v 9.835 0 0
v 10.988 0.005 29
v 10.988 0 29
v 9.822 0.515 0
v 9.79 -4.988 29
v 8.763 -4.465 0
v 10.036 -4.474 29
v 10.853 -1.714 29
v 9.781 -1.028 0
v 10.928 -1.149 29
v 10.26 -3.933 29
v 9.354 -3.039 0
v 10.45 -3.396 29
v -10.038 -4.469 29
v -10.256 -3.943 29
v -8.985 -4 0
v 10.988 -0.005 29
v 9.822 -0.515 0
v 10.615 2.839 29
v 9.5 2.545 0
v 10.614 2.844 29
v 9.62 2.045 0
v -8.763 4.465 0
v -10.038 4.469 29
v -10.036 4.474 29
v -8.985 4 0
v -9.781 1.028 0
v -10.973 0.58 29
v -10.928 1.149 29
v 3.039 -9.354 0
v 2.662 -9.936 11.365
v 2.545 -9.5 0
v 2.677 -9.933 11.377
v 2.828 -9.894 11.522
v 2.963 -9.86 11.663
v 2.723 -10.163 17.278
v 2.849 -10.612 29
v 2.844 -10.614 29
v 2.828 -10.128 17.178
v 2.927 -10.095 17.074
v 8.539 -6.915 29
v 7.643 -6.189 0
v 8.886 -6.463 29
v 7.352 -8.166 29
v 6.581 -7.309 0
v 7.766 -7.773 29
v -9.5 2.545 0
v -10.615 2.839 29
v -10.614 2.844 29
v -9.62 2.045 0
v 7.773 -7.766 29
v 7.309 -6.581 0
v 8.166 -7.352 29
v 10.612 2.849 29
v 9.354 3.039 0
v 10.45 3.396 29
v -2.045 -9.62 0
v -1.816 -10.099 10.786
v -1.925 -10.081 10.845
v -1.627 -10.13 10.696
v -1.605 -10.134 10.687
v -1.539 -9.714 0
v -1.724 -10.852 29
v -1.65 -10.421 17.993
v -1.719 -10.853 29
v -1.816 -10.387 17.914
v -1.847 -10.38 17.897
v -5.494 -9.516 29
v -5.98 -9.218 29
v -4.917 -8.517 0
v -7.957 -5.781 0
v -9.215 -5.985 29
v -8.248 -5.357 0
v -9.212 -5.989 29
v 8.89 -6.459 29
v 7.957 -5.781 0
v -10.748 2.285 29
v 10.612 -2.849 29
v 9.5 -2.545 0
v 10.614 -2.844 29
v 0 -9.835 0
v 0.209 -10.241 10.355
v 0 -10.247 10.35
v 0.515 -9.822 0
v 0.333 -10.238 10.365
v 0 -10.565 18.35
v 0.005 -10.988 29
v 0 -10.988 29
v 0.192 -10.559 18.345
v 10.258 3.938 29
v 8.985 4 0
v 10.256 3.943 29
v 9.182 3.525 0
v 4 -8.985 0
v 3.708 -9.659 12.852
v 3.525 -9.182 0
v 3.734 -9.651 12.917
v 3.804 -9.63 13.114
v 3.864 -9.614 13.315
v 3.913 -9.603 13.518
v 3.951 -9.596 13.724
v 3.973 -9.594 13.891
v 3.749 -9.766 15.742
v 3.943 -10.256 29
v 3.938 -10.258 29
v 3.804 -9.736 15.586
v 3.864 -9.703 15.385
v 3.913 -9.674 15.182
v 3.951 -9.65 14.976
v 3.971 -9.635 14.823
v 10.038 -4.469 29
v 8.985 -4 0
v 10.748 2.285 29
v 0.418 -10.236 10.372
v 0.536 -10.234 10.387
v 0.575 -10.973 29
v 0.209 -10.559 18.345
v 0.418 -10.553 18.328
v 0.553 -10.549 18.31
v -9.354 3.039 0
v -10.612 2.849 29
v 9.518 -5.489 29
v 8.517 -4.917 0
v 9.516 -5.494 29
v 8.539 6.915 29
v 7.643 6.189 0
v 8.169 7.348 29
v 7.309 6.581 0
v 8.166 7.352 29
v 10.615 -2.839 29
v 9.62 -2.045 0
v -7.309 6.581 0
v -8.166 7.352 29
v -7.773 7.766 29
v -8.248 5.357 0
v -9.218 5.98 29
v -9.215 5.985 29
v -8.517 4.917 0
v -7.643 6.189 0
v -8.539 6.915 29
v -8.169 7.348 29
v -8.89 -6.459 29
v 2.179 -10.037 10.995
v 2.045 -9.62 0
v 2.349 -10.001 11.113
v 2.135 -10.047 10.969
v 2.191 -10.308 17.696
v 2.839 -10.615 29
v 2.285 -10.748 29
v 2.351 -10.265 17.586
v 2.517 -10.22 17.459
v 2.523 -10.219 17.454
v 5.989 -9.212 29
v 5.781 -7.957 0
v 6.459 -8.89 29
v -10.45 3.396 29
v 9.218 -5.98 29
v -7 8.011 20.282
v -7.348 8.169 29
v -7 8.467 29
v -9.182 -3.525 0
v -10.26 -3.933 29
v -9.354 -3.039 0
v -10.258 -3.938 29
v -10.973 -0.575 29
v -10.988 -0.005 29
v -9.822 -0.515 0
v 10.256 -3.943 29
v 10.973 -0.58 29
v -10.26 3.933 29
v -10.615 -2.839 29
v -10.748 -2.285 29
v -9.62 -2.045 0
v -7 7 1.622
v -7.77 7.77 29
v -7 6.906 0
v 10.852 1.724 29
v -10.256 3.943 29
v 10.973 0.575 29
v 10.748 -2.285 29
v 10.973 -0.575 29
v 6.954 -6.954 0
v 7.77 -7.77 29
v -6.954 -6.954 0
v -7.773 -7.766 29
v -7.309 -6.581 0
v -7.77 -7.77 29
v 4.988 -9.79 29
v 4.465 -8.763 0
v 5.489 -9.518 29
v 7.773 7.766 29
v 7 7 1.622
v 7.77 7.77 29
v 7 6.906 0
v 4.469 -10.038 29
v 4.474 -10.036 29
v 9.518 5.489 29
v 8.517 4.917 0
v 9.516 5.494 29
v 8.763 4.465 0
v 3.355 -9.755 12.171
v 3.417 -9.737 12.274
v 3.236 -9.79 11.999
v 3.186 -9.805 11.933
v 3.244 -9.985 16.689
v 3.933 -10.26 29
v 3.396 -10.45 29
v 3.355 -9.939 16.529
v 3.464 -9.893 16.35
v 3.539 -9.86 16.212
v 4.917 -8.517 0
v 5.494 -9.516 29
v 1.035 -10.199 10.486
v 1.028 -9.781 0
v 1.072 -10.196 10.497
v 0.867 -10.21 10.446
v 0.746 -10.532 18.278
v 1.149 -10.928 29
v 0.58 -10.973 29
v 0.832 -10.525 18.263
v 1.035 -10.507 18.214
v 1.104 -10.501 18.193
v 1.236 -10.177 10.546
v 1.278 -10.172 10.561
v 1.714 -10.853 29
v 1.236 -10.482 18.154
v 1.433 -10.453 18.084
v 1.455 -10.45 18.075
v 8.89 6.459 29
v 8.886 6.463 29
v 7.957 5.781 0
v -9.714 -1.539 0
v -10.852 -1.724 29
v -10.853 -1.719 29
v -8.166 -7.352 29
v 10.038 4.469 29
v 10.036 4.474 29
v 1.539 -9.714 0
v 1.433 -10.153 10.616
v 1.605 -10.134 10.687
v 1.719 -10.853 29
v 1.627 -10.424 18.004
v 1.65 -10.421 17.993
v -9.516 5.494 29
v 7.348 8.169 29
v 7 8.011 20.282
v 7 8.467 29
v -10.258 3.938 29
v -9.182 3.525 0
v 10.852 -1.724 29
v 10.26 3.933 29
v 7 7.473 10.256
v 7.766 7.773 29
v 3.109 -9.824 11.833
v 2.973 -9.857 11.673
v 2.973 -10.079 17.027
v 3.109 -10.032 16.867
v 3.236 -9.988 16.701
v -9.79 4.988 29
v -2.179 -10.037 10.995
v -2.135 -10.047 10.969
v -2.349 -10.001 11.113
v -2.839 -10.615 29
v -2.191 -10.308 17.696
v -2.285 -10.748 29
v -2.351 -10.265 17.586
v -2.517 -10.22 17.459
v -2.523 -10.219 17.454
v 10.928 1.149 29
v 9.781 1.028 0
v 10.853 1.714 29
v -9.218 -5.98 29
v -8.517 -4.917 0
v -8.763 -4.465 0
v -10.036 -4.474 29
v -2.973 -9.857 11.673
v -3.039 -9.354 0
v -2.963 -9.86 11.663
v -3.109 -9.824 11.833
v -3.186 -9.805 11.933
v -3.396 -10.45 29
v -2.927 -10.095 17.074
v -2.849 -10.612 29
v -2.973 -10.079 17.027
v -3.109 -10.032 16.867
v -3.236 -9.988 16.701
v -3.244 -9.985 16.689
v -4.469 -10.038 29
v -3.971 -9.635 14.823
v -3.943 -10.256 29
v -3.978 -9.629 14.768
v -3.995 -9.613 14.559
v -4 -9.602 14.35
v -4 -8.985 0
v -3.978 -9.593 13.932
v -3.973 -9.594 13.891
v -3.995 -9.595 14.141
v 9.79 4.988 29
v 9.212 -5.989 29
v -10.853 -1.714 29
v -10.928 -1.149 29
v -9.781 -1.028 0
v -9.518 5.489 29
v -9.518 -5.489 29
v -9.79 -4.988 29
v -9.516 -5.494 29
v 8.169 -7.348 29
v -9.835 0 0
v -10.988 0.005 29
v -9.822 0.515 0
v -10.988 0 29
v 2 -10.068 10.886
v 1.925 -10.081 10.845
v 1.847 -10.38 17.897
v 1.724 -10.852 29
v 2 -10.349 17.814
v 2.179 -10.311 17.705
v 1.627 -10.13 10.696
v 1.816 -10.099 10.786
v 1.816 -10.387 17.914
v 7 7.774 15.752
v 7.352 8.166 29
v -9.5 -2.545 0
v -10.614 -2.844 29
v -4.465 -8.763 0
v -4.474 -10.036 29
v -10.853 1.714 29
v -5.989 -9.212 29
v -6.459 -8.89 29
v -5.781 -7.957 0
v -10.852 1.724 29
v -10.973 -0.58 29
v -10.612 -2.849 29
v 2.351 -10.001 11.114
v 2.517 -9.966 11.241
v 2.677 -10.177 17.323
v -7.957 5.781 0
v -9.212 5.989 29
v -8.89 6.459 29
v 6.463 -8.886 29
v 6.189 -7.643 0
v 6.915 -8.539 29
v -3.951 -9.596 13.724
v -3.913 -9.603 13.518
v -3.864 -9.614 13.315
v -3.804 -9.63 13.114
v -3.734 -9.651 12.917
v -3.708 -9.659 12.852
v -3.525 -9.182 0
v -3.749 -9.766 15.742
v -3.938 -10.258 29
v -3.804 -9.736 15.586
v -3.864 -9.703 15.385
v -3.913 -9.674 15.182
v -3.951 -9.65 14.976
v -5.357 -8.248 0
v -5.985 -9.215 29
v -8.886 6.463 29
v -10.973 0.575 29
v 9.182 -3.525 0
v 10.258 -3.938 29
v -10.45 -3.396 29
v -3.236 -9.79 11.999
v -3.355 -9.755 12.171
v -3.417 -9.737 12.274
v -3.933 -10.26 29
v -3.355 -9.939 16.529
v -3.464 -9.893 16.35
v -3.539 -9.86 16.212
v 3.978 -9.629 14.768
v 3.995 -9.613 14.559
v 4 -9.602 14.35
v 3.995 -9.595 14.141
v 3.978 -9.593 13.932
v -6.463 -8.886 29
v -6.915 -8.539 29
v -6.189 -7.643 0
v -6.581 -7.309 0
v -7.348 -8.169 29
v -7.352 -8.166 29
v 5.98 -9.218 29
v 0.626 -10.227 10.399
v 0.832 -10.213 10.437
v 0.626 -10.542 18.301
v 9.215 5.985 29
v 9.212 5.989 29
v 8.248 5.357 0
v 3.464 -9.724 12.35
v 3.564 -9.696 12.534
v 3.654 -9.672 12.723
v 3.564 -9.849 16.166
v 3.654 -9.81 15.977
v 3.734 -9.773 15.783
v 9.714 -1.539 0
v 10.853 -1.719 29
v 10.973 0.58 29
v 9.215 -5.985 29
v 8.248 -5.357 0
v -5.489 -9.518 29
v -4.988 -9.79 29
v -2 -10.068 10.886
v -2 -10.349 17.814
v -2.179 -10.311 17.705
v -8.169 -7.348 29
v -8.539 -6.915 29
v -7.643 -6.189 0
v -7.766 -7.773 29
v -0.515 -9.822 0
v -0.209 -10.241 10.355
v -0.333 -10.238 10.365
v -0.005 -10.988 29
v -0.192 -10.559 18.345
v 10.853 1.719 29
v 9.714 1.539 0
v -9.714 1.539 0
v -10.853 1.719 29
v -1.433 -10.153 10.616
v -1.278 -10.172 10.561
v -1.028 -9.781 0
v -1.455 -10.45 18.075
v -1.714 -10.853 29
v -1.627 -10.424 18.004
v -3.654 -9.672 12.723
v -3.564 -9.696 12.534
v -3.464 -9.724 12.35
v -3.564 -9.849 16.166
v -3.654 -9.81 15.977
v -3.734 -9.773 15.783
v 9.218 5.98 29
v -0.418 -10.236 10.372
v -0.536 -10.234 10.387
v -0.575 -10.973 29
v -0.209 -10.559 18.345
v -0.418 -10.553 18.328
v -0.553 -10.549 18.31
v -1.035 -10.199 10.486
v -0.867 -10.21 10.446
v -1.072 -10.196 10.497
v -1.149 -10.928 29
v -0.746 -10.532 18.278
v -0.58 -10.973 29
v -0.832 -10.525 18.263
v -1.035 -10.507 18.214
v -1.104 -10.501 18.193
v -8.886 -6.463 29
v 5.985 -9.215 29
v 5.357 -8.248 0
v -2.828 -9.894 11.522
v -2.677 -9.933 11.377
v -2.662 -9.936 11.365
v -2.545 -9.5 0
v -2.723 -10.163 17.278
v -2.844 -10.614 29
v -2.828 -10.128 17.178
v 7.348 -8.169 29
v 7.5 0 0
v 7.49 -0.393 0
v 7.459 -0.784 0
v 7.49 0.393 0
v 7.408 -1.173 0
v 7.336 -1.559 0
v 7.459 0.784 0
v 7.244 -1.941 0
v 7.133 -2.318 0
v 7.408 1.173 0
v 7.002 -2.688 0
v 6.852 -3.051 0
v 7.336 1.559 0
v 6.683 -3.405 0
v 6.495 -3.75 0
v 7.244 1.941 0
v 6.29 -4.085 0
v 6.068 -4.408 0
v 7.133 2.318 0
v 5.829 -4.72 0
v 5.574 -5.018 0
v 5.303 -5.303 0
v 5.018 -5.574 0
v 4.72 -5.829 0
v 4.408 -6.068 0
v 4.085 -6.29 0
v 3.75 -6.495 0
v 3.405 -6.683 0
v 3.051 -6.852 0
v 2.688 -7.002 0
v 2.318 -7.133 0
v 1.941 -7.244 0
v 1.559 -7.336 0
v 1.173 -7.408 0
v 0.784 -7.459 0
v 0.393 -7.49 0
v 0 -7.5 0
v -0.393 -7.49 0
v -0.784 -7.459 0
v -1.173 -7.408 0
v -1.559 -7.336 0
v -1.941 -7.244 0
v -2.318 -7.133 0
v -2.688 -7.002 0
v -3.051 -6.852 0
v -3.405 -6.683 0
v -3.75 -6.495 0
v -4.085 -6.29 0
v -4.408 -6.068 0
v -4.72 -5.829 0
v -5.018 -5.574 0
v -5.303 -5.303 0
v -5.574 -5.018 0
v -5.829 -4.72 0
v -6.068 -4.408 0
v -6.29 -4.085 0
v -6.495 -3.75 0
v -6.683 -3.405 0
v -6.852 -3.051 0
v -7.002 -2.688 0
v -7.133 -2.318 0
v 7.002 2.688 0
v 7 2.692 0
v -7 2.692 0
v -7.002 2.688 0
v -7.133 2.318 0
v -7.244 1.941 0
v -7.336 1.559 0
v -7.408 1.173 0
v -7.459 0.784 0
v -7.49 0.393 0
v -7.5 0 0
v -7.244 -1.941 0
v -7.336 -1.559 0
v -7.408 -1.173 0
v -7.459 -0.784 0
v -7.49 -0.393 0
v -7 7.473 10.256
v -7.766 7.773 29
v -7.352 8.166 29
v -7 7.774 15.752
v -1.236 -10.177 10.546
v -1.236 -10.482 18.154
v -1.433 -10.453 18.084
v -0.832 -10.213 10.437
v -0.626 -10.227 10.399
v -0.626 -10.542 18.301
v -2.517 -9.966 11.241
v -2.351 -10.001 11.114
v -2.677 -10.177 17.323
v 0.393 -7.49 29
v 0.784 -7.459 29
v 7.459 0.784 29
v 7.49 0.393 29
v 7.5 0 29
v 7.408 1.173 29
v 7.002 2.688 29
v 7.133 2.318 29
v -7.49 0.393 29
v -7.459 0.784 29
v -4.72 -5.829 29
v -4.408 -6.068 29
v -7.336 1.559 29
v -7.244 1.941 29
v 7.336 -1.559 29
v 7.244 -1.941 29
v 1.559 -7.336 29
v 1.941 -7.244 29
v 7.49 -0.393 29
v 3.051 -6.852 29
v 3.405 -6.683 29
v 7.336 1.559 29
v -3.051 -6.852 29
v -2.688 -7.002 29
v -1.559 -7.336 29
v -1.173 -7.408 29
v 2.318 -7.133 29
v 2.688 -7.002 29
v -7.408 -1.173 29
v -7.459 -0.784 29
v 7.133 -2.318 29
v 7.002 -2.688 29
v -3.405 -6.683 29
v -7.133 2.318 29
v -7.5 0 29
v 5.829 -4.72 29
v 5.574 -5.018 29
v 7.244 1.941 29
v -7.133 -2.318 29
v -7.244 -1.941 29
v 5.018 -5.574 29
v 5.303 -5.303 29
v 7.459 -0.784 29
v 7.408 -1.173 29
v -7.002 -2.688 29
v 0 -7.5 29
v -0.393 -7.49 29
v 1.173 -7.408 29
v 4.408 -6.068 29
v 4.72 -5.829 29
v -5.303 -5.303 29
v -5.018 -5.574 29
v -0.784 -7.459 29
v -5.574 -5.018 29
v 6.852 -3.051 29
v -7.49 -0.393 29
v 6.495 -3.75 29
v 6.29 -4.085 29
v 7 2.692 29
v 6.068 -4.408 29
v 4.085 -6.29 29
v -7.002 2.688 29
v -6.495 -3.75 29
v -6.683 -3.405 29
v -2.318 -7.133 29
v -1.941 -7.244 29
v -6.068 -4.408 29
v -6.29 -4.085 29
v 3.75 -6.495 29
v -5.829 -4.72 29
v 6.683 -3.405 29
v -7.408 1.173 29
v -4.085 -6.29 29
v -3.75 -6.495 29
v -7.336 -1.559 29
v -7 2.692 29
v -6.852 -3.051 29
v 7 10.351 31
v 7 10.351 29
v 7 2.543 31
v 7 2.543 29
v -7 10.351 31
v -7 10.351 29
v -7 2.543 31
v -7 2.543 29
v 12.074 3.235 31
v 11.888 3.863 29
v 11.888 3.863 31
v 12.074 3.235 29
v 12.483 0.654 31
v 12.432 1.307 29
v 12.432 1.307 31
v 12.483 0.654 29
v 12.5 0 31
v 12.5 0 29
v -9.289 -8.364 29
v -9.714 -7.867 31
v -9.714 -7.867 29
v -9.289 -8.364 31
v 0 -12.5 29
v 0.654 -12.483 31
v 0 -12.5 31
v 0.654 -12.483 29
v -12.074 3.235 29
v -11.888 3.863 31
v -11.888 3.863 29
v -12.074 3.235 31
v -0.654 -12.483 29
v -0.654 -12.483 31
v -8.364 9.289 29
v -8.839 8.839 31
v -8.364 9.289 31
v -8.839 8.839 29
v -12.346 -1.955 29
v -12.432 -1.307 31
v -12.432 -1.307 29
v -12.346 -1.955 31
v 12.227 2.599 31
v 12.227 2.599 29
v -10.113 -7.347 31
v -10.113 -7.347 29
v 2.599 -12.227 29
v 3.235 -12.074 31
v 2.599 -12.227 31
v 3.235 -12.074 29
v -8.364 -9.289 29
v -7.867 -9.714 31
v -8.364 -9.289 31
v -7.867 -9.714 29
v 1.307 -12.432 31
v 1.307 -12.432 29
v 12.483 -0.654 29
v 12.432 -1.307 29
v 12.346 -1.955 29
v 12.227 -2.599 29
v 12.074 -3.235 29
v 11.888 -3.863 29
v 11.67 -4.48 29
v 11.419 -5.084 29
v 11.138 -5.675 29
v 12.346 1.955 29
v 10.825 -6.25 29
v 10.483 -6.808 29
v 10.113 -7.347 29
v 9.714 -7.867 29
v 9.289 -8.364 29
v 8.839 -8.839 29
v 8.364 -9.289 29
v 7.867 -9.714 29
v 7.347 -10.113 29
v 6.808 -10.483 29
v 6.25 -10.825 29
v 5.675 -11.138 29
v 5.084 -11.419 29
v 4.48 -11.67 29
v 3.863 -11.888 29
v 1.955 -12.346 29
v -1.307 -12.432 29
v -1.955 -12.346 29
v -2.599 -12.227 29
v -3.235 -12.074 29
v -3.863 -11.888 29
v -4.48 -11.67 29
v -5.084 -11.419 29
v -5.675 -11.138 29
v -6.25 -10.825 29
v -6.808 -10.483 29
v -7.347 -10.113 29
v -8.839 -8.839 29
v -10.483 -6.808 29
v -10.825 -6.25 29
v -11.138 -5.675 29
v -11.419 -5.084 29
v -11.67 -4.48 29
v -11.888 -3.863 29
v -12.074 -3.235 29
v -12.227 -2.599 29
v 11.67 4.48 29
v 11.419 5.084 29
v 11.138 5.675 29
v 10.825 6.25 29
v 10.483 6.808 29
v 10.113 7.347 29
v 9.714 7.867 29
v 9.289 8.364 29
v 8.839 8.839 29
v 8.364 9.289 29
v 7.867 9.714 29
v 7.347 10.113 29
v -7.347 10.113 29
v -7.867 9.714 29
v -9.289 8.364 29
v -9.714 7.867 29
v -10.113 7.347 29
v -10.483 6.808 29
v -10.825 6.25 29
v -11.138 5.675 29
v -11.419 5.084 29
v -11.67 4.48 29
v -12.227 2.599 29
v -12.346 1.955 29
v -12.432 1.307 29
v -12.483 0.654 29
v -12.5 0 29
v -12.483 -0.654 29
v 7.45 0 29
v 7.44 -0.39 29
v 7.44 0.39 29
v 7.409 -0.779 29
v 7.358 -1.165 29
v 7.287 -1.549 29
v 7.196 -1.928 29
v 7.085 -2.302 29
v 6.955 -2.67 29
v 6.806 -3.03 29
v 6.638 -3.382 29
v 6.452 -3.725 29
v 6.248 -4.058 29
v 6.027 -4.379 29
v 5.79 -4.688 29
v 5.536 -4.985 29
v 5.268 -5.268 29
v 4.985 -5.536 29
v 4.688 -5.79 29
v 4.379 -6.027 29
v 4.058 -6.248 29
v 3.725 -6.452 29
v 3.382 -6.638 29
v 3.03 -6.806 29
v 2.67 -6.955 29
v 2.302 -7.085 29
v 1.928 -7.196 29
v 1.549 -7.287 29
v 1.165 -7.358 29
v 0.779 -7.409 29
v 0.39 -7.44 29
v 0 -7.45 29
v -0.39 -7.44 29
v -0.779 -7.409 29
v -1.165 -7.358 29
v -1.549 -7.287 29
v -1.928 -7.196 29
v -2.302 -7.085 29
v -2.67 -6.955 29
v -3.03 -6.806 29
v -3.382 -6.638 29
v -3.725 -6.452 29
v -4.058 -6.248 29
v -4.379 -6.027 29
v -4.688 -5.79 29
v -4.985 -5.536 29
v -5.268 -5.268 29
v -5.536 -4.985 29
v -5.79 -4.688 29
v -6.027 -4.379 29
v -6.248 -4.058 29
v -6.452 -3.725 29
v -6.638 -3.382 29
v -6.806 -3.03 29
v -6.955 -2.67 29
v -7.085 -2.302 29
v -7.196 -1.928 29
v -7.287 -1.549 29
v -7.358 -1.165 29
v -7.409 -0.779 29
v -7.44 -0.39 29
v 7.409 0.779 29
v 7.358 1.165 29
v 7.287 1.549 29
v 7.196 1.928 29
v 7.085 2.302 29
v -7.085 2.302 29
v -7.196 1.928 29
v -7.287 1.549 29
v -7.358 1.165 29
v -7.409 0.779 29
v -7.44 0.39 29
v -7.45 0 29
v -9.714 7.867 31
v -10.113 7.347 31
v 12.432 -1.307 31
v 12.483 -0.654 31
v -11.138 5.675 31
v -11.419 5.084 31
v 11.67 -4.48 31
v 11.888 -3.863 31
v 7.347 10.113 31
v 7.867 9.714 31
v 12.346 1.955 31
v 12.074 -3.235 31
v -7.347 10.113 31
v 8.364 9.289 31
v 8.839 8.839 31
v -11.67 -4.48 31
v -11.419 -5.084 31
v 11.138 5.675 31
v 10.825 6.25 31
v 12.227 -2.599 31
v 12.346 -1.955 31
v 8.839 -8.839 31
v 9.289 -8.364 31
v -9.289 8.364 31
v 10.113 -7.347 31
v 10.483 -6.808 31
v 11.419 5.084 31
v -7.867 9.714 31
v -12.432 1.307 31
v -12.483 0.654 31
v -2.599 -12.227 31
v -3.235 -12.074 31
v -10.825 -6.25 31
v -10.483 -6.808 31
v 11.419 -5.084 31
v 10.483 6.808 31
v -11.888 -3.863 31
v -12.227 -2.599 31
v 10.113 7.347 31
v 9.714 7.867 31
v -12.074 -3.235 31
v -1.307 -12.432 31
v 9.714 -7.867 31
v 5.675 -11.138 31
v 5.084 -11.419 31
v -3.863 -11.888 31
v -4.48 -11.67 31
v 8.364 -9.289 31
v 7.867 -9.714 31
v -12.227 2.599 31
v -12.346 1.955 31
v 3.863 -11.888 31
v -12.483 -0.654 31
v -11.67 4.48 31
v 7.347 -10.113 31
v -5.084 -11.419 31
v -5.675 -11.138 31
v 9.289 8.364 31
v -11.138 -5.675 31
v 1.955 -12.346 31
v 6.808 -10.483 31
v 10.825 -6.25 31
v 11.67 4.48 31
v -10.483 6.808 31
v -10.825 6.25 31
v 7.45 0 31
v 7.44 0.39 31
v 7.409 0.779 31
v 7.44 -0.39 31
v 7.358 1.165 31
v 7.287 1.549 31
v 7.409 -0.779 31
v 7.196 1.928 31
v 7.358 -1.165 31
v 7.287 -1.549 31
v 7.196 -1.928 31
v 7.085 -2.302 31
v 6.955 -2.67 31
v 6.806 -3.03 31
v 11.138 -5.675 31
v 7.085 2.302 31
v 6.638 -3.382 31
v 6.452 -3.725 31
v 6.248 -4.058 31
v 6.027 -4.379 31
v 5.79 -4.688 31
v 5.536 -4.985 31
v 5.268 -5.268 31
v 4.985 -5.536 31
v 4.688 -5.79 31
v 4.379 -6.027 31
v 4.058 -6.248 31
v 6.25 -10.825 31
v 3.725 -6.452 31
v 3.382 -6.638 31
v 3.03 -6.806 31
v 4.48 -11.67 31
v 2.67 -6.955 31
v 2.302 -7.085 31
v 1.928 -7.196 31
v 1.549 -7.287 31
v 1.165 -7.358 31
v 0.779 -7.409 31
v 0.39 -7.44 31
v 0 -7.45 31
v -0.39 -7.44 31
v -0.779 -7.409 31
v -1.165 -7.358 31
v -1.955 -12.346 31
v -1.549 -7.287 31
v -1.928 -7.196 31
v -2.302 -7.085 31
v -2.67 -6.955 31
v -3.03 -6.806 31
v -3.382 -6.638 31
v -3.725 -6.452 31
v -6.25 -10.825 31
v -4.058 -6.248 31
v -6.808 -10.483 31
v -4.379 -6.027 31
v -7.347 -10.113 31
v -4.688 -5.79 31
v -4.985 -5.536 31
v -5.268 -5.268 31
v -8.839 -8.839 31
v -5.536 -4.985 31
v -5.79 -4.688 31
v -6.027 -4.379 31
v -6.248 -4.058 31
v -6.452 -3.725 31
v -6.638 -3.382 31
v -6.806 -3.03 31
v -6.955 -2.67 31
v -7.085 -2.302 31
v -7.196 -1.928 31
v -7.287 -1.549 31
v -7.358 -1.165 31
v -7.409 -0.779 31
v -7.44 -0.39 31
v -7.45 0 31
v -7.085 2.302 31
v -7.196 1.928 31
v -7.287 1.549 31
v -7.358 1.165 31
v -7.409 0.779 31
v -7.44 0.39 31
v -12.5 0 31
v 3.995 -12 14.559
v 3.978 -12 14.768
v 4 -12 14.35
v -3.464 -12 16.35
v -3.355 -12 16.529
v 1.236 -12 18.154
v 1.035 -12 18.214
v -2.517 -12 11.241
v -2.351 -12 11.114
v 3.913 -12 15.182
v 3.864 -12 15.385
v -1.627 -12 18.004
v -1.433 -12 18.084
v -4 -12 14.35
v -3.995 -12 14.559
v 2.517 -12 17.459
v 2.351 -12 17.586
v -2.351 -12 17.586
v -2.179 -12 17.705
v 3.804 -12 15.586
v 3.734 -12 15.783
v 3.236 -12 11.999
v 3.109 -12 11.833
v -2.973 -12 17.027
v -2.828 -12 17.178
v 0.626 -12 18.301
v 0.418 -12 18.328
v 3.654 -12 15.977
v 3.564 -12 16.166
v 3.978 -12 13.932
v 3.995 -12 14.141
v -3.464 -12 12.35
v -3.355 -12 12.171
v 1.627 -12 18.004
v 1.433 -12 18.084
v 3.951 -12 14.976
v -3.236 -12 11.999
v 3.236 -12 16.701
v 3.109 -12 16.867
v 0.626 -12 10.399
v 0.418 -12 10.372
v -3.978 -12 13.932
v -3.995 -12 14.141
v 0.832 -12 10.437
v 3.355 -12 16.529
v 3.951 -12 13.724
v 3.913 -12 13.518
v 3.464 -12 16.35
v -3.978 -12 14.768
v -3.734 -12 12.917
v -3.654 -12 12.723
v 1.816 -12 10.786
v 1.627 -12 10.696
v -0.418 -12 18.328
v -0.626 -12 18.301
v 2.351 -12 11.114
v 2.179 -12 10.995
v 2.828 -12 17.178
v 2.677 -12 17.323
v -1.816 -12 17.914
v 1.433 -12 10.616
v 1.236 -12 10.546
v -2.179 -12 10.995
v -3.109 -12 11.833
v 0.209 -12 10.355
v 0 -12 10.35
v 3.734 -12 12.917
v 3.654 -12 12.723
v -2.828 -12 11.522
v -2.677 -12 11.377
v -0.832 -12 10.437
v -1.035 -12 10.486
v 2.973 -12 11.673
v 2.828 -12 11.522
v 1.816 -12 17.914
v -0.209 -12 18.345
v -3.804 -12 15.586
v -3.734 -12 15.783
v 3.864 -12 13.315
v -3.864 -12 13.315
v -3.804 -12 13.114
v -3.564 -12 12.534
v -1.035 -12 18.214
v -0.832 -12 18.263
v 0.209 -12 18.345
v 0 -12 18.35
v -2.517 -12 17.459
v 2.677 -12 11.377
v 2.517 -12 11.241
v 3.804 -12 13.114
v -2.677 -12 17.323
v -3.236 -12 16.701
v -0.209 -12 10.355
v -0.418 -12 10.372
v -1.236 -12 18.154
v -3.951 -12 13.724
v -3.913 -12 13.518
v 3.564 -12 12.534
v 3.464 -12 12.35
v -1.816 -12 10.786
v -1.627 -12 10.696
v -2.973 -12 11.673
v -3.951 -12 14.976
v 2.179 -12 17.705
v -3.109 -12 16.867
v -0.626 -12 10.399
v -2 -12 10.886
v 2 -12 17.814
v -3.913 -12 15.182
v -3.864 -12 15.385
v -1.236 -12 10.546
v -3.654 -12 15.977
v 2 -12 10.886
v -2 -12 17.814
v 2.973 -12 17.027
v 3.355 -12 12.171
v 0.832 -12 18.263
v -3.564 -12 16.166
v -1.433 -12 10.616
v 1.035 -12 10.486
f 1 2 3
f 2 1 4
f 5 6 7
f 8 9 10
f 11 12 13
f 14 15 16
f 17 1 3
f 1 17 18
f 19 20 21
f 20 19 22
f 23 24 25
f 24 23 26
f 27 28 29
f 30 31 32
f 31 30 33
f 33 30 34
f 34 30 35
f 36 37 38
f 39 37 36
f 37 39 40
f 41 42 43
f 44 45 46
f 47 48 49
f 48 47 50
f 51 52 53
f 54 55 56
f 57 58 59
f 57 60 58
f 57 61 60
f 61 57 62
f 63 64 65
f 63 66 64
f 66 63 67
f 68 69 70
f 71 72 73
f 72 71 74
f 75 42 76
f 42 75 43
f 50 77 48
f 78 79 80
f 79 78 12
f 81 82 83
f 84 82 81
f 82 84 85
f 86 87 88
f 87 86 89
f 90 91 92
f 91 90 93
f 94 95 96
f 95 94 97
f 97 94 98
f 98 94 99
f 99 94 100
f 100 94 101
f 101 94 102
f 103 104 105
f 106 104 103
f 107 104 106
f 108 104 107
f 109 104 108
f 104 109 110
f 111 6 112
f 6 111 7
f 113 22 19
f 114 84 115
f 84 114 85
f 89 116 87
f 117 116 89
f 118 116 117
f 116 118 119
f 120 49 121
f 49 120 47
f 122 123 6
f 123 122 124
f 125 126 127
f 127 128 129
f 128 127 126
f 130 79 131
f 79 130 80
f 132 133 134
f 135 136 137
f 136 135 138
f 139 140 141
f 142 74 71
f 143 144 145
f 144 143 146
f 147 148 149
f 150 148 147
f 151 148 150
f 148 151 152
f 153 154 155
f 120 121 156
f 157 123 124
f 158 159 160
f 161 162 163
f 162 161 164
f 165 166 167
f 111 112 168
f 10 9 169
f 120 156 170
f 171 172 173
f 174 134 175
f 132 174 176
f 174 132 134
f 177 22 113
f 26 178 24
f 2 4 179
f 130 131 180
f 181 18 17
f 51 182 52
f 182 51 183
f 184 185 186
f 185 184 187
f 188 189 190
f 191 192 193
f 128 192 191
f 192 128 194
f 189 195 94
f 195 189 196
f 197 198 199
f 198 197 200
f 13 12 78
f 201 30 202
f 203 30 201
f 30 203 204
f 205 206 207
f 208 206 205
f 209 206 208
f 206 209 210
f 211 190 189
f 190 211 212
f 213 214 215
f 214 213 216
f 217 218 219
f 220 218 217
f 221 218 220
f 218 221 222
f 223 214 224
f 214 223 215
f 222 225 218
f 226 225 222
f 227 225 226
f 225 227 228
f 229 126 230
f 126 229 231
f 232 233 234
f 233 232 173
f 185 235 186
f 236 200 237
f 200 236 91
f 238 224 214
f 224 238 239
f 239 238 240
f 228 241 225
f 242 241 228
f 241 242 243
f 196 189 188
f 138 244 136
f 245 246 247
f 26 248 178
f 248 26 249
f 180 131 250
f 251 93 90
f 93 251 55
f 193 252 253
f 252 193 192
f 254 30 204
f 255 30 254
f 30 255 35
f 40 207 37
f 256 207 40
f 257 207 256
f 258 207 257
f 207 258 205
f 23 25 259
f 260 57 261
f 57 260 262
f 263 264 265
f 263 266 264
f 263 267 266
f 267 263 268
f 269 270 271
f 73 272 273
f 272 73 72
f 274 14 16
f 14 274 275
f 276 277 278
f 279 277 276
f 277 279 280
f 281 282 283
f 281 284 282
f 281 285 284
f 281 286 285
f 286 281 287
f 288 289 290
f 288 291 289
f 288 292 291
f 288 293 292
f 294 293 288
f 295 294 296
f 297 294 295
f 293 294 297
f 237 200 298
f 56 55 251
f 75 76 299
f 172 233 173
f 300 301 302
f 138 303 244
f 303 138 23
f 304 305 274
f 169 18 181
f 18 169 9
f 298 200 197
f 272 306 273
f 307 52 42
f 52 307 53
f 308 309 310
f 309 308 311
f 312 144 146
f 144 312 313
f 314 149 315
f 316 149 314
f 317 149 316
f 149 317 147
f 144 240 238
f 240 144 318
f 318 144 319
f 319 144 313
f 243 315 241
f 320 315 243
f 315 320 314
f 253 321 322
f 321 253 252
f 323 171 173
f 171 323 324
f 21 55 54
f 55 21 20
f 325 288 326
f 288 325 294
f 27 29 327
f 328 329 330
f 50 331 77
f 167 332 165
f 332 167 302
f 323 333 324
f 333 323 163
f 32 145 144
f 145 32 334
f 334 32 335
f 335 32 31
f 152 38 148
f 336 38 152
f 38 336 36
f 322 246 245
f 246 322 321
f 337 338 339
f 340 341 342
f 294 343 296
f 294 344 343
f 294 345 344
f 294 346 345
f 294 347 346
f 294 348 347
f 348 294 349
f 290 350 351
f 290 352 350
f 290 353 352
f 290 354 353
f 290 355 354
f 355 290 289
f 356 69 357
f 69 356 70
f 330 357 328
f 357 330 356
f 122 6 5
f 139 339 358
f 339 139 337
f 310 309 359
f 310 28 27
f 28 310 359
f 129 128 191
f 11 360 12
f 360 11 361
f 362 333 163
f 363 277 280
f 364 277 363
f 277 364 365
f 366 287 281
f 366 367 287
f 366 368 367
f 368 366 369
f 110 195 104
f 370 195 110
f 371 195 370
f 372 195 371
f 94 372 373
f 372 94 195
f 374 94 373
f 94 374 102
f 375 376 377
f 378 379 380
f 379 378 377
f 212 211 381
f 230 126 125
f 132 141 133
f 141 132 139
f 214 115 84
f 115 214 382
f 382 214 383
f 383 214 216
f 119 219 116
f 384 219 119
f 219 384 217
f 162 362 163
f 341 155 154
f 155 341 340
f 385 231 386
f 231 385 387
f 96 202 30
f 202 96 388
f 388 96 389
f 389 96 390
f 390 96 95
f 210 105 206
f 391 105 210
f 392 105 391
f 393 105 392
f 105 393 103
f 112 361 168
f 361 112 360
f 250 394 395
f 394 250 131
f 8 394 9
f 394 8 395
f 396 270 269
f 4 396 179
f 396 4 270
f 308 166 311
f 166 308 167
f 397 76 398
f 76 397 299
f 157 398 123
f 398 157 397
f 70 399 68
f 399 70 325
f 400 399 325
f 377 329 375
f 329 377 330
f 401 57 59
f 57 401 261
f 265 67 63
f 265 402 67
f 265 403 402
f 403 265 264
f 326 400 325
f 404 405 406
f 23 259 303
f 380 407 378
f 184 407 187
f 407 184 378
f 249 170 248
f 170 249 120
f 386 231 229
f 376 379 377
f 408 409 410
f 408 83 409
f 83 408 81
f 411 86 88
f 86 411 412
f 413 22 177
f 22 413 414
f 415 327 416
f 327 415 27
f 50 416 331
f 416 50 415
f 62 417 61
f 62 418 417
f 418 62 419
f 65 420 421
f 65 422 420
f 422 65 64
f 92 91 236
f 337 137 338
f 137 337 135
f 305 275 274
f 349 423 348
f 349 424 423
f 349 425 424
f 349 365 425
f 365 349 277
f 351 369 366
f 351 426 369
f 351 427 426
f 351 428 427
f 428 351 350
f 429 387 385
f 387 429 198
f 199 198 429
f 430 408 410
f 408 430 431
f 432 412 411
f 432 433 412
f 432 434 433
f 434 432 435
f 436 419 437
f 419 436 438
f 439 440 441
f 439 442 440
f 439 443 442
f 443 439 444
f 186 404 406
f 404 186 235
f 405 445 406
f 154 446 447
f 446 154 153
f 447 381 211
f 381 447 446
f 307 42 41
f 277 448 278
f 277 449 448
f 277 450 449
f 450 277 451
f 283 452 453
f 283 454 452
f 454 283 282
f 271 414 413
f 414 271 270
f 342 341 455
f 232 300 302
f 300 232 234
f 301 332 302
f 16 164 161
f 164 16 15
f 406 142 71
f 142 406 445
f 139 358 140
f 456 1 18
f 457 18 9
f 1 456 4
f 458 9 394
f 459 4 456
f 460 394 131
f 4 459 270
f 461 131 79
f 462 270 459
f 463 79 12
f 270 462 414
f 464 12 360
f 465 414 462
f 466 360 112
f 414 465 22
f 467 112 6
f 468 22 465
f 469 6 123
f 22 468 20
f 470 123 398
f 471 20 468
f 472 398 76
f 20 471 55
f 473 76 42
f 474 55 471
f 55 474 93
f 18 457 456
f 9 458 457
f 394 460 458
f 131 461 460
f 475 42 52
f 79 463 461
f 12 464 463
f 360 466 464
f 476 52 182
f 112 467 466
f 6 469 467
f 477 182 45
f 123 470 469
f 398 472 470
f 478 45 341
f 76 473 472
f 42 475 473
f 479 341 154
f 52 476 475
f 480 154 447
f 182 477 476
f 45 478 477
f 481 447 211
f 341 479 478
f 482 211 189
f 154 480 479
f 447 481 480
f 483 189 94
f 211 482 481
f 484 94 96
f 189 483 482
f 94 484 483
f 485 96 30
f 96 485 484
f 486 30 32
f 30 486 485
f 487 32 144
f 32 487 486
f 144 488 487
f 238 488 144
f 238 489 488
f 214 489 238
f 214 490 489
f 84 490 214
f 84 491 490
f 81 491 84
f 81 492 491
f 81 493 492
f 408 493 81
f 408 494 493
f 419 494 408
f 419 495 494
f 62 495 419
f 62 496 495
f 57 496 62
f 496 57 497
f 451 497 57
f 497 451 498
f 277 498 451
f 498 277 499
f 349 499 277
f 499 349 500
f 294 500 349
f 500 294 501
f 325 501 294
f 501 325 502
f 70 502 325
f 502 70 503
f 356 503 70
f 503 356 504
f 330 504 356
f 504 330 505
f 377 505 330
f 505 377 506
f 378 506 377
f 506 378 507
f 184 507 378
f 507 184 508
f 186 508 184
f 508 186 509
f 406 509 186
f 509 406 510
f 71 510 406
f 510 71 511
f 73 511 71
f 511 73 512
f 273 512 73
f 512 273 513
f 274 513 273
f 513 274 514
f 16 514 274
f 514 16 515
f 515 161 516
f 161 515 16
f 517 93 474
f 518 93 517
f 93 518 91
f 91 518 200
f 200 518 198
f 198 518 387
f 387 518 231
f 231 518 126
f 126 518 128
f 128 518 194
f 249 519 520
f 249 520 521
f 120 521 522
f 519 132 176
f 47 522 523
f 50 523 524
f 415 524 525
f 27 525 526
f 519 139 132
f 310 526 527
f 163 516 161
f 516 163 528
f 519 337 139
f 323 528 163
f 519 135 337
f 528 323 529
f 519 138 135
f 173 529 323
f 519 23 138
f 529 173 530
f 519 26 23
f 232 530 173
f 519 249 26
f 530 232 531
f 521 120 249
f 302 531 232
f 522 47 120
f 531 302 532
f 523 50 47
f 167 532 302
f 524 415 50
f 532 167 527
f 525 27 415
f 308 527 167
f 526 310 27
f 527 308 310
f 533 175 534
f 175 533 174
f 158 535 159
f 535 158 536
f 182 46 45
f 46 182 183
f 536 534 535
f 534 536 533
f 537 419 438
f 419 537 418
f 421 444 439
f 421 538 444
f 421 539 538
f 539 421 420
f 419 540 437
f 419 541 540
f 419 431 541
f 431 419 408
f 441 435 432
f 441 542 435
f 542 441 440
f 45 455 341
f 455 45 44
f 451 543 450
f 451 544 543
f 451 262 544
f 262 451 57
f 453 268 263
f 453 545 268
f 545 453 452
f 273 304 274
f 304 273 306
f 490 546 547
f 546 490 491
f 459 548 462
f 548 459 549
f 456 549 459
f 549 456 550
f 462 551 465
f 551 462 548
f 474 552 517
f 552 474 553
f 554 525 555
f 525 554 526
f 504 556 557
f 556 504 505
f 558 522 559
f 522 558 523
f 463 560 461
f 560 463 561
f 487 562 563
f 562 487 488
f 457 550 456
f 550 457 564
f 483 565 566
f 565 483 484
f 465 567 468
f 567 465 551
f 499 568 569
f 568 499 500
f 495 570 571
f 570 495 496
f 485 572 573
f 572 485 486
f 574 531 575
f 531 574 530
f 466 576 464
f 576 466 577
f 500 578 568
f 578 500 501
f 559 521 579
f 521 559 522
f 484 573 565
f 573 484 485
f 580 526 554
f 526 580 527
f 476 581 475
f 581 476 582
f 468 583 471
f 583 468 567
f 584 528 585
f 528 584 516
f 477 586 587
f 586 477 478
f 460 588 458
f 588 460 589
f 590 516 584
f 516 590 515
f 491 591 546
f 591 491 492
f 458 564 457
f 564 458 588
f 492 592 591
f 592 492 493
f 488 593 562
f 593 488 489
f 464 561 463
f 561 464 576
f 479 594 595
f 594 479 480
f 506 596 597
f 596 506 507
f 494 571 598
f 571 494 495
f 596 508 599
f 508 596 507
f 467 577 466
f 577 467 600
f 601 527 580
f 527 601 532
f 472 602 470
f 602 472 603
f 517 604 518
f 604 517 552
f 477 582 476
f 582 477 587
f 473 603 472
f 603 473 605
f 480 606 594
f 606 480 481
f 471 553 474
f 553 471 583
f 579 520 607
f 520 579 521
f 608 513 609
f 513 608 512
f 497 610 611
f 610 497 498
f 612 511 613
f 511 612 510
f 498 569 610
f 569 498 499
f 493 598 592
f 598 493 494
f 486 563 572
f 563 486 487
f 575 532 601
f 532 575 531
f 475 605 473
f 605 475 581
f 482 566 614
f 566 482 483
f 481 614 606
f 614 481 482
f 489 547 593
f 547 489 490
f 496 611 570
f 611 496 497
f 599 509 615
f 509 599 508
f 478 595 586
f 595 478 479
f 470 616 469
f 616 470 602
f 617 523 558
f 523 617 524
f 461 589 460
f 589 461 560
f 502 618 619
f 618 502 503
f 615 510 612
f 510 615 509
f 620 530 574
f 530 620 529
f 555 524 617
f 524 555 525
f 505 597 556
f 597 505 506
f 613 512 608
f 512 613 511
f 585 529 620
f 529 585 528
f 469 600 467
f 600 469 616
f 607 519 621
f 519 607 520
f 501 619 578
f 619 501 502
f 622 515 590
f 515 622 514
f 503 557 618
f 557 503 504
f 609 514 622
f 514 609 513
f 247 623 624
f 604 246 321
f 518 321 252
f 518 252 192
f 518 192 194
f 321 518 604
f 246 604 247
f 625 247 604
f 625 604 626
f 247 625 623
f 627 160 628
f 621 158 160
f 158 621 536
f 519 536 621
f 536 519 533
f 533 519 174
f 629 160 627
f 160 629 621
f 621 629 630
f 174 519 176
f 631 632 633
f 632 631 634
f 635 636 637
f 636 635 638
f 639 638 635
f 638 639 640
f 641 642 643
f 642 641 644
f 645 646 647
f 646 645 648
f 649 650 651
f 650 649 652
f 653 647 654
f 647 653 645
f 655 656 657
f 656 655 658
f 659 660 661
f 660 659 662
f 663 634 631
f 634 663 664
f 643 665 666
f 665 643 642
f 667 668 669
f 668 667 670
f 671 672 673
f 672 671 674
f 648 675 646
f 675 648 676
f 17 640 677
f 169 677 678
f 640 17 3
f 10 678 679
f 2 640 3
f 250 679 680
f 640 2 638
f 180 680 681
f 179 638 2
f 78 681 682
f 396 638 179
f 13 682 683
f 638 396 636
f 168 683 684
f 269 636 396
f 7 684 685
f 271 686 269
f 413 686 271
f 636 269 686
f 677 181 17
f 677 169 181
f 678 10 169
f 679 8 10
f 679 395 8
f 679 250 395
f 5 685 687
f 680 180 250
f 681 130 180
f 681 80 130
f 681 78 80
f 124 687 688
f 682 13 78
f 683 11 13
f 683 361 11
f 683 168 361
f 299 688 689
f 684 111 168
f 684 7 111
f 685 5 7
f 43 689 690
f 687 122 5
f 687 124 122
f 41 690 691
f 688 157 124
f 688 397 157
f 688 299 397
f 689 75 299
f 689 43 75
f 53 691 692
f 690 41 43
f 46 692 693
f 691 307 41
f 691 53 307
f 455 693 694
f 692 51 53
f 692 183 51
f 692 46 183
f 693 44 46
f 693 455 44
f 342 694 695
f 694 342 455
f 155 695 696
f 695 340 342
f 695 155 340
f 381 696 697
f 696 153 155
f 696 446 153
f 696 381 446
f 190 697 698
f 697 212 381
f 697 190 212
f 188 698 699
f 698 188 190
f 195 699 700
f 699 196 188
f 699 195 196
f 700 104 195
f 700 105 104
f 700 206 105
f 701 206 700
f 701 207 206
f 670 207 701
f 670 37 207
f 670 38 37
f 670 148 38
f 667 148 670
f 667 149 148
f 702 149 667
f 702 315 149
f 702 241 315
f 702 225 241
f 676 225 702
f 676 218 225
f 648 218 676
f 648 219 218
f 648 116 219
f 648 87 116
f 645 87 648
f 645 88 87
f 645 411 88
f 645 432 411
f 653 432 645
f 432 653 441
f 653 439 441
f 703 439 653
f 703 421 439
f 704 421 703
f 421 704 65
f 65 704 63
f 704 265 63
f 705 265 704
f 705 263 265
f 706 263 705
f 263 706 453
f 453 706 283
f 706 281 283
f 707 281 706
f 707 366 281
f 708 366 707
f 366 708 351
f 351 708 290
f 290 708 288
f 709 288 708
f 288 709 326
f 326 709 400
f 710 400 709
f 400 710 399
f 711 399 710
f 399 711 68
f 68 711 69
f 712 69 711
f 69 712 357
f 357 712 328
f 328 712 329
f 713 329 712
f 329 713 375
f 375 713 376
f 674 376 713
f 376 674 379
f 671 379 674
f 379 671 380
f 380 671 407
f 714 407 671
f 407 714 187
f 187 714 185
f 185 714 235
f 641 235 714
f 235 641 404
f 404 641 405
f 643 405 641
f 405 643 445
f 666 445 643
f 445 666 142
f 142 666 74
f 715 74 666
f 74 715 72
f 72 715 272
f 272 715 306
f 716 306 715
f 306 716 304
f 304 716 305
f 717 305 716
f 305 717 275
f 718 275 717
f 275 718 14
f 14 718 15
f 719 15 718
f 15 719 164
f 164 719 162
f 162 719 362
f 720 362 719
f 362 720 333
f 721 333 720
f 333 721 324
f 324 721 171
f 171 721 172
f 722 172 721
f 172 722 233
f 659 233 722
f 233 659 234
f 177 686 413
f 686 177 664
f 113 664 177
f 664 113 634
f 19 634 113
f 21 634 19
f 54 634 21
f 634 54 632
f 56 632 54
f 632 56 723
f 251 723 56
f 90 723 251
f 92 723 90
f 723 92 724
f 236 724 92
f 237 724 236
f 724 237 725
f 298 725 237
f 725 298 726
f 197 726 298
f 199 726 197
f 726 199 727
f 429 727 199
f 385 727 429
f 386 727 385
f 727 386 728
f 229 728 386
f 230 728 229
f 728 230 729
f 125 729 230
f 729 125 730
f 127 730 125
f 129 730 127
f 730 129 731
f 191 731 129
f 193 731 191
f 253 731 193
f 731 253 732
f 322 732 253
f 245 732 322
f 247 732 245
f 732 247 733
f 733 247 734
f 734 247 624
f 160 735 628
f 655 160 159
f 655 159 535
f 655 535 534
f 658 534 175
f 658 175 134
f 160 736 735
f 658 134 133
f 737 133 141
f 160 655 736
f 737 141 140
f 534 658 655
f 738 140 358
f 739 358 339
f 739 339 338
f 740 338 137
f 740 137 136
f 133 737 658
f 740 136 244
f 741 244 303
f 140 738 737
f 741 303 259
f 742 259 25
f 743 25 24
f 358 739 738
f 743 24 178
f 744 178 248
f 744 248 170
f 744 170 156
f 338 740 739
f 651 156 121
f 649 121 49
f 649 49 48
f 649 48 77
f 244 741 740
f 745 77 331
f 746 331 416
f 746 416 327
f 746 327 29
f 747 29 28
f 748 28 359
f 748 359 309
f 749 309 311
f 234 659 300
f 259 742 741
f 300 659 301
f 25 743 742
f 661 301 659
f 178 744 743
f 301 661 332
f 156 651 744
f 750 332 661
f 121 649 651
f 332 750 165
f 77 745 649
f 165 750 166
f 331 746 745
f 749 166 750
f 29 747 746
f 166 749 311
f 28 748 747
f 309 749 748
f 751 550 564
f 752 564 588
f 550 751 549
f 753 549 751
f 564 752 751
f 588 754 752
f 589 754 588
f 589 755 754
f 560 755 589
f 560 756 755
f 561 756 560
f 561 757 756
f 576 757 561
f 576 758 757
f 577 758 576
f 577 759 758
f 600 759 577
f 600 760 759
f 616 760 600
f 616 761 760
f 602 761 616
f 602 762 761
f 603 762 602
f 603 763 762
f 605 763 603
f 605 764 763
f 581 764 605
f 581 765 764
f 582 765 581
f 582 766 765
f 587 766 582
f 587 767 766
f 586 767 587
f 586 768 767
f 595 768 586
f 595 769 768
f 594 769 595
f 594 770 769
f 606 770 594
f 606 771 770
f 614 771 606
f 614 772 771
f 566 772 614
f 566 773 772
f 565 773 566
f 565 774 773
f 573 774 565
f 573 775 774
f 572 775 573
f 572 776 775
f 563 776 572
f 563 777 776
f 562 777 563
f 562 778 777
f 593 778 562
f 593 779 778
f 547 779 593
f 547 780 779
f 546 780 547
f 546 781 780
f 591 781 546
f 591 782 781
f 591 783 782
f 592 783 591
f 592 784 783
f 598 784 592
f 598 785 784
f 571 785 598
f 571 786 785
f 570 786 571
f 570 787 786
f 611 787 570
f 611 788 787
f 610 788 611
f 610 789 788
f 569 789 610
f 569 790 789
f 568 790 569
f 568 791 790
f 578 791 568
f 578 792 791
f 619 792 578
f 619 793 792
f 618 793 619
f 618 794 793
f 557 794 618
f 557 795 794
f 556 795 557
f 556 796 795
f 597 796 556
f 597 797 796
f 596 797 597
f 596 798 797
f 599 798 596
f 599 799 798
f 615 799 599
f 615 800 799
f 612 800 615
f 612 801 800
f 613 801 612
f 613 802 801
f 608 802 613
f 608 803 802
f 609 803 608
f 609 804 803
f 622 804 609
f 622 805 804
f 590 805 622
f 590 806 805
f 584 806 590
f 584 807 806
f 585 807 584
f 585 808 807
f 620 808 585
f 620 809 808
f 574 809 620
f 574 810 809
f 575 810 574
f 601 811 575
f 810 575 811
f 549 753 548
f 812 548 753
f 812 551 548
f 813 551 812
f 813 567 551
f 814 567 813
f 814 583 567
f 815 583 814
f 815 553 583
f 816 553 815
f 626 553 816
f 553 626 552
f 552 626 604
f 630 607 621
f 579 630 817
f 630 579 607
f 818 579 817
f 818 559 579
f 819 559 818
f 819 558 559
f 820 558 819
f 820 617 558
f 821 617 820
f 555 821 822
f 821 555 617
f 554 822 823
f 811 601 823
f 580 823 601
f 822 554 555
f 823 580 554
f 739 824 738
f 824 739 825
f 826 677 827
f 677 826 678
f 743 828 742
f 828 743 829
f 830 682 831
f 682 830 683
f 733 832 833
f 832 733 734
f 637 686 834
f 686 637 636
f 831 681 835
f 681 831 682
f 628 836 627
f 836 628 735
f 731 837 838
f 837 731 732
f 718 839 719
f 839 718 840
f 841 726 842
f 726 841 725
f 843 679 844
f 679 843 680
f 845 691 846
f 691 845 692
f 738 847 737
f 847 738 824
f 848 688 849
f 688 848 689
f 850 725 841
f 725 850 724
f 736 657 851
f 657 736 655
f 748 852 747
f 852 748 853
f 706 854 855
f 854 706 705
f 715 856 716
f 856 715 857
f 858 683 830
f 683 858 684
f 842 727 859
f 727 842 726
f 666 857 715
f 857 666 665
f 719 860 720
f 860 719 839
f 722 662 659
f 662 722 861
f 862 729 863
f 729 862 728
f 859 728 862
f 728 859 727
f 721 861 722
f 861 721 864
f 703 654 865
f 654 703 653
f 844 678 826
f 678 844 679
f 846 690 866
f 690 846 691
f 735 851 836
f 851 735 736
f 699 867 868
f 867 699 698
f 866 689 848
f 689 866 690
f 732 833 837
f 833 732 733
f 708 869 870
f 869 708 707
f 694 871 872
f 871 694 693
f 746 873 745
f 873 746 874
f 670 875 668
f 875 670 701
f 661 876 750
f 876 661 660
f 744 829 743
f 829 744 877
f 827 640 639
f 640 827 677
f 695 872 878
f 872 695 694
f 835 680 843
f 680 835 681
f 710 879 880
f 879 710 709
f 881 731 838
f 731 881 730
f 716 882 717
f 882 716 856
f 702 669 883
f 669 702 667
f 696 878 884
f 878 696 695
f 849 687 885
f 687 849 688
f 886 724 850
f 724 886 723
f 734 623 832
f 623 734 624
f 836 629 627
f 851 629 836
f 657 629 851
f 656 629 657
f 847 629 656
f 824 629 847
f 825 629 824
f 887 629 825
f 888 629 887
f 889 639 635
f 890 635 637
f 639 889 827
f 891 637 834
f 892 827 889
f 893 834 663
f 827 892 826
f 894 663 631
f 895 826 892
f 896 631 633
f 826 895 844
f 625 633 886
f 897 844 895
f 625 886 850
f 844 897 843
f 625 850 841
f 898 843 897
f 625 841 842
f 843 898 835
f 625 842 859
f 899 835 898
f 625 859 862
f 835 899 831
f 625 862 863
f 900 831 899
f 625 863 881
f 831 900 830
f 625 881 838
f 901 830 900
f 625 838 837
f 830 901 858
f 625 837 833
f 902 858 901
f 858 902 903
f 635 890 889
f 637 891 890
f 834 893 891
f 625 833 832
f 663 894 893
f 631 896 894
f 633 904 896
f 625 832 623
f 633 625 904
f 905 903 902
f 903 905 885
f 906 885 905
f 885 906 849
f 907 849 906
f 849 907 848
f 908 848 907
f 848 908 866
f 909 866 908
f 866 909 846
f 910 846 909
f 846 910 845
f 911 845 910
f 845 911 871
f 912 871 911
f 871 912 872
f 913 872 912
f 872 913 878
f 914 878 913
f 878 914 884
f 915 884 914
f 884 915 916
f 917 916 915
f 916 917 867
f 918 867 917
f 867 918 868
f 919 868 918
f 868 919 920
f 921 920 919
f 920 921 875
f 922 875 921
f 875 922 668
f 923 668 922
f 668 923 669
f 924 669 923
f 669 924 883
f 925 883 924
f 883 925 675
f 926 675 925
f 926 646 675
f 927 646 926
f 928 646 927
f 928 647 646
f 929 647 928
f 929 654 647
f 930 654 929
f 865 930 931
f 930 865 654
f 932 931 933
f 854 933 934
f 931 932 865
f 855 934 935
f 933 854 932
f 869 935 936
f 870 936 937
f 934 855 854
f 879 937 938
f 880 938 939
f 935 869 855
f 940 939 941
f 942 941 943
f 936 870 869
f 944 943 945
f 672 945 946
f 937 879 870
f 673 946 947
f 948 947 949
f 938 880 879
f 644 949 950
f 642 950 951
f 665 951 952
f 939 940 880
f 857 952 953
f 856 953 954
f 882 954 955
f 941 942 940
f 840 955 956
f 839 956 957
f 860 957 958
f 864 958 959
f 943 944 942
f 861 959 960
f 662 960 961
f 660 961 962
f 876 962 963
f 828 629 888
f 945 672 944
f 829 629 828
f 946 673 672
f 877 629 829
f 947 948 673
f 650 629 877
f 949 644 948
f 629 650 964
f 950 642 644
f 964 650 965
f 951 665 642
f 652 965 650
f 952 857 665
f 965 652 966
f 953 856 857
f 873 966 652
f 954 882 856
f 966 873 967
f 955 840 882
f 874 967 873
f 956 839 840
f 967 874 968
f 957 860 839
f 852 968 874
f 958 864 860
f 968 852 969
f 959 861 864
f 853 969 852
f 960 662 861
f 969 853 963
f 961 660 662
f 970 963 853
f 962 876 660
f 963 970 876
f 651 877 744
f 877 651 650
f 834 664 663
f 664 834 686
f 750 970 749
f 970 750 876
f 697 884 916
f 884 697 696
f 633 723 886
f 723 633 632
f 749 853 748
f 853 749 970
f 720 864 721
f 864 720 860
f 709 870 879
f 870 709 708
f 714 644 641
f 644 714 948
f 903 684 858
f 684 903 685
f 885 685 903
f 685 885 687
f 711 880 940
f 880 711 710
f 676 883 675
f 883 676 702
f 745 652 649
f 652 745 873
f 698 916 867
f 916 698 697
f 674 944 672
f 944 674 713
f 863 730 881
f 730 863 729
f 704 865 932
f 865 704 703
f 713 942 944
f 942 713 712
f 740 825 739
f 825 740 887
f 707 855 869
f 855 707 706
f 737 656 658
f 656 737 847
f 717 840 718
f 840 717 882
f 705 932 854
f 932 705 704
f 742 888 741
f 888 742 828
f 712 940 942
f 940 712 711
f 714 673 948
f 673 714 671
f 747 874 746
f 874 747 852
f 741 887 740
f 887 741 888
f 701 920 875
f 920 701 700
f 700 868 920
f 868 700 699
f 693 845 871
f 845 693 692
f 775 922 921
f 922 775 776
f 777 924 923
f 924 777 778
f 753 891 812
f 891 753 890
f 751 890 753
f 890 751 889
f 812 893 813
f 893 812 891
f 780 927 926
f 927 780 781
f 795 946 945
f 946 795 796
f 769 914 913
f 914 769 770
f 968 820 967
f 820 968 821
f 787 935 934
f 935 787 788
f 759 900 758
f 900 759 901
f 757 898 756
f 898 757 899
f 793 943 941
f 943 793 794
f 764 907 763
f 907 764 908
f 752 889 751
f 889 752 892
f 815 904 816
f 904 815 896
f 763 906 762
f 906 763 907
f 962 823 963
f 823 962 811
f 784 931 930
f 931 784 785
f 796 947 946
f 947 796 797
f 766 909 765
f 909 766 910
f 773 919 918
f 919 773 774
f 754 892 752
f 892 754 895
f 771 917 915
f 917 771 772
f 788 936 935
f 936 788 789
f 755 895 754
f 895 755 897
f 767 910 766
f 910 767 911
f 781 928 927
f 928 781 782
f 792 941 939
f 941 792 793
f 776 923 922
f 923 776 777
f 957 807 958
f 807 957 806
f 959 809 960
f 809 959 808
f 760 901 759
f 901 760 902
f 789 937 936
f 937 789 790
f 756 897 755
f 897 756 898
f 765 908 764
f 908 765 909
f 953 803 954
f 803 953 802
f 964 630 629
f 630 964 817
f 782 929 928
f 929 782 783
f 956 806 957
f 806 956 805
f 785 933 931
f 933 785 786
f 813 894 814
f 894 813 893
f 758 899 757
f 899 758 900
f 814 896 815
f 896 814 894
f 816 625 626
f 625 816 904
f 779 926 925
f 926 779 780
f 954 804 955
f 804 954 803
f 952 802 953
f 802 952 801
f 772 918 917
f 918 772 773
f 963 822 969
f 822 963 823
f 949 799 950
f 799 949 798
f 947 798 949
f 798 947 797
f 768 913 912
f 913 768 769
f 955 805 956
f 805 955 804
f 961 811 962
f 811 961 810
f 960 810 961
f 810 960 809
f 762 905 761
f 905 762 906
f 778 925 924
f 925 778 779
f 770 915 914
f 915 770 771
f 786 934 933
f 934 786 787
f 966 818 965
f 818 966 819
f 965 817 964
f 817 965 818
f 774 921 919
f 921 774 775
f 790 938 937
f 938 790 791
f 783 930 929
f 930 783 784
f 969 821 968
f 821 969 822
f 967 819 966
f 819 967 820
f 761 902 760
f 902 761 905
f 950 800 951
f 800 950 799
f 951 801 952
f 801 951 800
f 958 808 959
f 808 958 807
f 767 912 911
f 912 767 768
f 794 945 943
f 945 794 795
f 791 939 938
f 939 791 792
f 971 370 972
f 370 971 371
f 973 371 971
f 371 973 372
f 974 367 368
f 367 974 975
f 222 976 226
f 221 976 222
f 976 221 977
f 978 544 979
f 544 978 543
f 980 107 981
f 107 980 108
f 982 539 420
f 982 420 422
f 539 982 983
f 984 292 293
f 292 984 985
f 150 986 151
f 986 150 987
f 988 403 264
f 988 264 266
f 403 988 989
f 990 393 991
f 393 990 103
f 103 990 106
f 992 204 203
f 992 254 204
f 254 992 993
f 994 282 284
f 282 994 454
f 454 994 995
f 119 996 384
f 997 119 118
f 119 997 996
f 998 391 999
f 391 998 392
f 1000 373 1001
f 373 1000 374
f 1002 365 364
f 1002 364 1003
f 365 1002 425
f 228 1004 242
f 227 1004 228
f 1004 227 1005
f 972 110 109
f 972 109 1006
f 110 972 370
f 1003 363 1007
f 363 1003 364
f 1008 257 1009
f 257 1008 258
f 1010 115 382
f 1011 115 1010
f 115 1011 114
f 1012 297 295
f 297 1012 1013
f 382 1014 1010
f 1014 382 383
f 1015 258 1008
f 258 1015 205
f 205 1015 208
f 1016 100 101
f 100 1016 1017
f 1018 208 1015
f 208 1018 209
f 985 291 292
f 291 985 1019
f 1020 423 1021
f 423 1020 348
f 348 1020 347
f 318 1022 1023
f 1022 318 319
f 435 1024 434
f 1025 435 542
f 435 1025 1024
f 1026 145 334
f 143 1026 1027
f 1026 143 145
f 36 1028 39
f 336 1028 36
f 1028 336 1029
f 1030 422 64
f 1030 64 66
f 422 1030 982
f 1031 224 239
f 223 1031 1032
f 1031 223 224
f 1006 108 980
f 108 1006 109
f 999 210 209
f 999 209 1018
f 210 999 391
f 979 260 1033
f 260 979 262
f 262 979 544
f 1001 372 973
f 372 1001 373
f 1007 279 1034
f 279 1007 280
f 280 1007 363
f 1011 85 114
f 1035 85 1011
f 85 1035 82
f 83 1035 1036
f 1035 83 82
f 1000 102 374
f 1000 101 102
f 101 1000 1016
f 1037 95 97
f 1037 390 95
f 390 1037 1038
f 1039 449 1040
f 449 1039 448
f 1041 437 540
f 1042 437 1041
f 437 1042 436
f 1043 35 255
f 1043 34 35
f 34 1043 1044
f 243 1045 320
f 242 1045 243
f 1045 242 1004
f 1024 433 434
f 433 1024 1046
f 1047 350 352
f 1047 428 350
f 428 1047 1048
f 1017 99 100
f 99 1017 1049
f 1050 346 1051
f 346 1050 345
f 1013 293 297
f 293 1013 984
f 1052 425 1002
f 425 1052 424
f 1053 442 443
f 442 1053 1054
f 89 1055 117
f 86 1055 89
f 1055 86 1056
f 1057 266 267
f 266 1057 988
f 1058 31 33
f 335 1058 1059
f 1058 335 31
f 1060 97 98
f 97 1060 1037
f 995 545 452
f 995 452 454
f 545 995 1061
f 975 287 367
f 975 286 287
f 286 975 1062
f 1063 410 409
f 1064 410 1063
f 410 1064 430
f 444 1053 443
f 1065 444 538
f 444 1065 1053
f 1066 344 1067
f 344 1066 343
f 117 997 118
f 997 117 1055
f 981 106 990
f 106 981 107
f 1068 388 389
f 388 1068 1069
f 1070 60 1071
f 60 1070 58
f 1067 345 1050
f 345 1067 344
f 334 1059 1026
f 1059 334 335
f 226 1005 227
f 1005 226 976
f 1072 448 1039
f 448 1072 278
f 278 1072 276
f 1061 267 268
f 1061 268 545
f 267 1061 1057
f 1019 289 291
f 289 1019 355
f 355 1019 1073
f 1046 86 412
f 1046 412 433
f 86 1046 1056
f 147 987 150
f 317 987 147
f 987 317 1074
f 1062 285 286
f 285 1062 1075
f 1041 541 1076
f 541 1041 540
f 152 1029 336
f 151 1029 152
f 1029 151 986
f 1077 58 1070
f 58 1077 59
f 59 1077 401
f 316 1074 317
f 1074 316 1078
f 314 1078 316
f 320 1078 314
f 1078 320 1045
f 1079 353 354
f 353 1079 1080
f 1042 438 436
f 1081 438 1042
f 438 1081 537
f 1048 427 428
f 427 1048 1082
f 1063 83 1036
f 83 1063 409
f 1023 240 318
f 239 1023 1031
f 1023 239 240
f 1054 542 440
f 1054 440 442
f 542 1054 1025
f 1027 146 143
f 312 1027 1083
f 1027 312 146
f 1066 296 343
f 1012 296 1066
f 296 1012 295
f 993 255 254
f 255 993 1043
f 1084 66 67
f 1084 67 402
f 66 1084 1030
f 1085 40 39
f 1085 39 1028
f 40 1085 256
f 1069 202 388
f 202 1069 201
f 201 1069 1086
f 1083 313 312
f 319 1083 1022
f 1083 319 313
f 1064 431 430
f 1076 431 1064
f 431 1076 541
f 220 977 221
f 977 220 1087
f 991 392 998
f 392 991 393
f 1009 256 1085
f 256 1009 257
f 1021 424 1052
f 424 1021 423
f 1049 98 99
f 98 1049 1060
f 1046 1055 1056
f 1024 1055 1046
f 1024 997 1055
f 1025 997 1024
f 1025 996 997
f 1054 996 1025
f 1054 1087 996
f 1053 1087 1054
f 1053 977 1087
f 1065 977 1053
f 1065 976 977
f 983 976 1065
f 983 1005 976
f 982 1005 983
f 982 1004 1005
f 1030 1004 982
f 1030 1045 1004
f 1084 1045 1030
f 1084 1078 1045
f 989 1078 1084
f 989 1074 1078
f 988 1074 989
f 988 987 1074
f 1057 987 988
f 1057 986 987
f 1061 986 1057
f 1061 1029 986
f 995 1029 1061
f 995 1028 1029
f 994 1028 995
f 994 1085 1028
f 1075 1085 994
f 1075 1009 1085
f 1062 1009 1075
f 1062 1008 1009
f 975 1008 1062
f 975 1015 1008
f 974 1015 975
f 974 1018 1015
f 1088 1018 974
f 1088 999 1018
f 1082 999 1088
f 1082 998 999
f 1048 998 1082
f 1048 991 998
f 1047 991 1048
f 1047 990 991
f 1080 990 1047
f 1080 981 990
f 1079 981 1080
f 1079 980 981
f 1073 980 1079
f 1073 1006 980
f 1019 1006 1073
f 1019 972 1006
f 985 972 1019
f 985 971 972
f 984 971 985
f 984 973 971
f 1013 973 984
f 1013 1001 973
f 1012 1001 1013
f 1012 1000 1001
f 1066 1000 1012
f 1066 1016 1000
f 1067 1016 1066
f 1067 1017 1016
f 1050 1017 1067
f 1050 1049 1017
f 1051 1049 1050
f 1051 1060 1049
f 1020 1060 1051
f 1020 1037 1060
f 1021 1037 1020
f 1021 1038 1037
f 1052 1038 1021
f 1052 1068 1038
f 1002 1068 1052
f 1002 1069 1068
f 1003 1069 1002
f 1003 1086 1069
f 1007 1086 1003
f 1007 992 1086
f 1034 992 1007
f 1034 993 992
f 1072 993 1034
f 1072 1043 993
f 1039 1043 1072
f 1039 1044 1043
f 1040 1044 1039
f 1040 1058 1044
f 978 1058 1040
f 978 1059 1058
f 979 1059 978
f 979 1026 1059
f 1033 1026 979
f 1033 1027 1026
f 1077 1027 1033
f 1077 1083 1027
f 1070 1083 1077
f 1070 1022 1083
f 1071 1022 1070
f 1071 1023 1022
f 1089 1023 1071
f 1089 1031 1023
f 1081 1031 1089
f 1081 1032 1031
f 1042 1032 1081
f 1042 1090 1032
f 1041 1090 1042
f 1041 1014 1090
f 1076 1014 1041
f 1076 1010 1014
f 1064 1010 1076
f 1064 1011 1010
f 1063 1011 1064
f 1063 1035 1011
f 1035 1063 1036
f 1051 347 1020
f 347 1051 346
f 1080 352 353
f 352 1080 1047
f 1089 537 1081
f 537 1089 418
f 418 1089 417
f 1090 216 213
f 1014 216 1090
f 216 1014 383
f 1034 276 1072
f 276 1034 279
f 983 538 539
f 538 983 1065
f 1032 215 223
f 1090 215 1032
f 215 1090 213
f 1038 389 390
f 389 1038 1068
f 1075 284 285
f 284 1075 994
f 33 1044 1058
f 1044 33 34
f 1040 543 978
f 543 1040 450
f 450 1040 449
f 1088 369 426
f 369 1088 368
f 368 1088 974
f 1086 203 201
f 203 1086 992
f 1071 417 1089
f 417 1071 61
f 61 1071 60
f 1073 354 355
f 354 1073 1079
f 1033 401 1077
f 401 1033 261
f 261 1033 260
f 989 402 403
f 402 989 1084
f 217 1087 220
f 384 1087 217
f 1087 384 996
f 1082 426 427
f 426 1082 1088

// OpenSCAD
difference(){
    translate([0,0,0]){
        union(){
            difference(){
                cylinder (d1 = 19.67, d2=22, h = 29.3, $fn = 120);
                translate ([0,0,-1])
                    cylinder (d = 15, h = 31, $fn = 120);
                translate ([-7,1,-1])
                    cube ([14,10,31]);
            }
            translate ([0,0,14])
                difference(){
                    translate ([0,0,15])
                        cylinder (d = 25, h= 2, $fn=120);
                    translate ([0,0,14])
                        cylinder (d = 14.9, h= 4, $fn=120);
                    translate ([-7,0,-1])
                        cube ([14,15,20]);
            }
            color([1,1,0])
                translate([0,-9,14.35])
                    rotate ([90,0,0])
                        cylinder (d=8, h=3, $fn=120);
        }
    }
    translate([-25,-25,-150])
        cube([50,50,50]);
}
